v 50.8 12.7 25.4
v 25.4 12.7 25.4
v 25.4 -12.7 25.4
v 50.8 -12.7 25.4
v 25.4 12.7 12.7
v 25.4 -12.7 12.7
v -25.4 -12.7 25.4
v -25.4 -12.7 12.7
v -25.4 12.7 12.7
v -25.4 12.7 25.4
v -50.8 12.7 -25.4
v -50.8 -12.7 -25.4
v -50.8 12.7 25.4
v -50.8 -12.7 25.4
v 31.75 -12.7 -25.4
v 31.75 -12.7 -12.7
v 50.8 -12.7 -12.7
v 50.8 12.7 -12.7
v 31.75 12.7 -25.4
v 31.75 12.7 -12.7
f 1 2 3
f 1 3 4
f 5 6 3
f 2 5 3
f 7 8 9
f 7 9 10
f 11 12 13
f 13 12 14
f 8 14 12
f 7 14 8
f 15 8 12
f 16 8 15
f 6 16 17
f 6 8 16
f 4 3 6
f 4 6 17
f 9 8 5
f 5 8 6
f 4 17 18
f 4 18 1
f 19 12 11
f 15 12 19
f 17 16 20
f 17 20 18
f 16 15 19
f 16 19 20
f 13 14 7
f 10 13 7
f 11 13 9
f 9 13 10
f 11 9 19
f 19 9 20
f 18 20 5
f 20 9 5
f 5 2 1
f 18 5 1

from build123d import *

# Parameters (mm, degrees)
F0_W     = 101.6
F0_H     = 50.8
F1_DEPTH = 12.7
F2_W     = 19.05
F2_H     = 12.7
F3_DEPTH = 25.401
F4_W     = 50.8
F4_H     = 12.7
F5_DEPTH = 25.401


with BuildPart() as f1:
    # F0 (on Front) → F1 (new body, symmetric)
    with BuildSketch(Plane.XZ):
        Rectangle(F0_W, F0_H)
    extrude(amount=F1_DEPTH, both=True)

    # F2 (on face) → F3 (cut, through all)
    with BuildSketch(Plane.XZ.offset(12.7)):
        with Locations((41.275, -19.05)):
            Rectangle(F2_W, F2_H)
    extrude(amount=-F3_DEPTH, mode=Mode.SUBTRACT)

    # F4 (on face) → F5 (cut, through all)
    with BuildSketch(Plane.XZ.offset(12.7)):
        with Locations((0, 19.05)):
            Rectangle(F4_W, F4_H)
    extrude(amount=-F5_DEPTH, mode=Mode.SUBTRACT)


solid = f1.part
